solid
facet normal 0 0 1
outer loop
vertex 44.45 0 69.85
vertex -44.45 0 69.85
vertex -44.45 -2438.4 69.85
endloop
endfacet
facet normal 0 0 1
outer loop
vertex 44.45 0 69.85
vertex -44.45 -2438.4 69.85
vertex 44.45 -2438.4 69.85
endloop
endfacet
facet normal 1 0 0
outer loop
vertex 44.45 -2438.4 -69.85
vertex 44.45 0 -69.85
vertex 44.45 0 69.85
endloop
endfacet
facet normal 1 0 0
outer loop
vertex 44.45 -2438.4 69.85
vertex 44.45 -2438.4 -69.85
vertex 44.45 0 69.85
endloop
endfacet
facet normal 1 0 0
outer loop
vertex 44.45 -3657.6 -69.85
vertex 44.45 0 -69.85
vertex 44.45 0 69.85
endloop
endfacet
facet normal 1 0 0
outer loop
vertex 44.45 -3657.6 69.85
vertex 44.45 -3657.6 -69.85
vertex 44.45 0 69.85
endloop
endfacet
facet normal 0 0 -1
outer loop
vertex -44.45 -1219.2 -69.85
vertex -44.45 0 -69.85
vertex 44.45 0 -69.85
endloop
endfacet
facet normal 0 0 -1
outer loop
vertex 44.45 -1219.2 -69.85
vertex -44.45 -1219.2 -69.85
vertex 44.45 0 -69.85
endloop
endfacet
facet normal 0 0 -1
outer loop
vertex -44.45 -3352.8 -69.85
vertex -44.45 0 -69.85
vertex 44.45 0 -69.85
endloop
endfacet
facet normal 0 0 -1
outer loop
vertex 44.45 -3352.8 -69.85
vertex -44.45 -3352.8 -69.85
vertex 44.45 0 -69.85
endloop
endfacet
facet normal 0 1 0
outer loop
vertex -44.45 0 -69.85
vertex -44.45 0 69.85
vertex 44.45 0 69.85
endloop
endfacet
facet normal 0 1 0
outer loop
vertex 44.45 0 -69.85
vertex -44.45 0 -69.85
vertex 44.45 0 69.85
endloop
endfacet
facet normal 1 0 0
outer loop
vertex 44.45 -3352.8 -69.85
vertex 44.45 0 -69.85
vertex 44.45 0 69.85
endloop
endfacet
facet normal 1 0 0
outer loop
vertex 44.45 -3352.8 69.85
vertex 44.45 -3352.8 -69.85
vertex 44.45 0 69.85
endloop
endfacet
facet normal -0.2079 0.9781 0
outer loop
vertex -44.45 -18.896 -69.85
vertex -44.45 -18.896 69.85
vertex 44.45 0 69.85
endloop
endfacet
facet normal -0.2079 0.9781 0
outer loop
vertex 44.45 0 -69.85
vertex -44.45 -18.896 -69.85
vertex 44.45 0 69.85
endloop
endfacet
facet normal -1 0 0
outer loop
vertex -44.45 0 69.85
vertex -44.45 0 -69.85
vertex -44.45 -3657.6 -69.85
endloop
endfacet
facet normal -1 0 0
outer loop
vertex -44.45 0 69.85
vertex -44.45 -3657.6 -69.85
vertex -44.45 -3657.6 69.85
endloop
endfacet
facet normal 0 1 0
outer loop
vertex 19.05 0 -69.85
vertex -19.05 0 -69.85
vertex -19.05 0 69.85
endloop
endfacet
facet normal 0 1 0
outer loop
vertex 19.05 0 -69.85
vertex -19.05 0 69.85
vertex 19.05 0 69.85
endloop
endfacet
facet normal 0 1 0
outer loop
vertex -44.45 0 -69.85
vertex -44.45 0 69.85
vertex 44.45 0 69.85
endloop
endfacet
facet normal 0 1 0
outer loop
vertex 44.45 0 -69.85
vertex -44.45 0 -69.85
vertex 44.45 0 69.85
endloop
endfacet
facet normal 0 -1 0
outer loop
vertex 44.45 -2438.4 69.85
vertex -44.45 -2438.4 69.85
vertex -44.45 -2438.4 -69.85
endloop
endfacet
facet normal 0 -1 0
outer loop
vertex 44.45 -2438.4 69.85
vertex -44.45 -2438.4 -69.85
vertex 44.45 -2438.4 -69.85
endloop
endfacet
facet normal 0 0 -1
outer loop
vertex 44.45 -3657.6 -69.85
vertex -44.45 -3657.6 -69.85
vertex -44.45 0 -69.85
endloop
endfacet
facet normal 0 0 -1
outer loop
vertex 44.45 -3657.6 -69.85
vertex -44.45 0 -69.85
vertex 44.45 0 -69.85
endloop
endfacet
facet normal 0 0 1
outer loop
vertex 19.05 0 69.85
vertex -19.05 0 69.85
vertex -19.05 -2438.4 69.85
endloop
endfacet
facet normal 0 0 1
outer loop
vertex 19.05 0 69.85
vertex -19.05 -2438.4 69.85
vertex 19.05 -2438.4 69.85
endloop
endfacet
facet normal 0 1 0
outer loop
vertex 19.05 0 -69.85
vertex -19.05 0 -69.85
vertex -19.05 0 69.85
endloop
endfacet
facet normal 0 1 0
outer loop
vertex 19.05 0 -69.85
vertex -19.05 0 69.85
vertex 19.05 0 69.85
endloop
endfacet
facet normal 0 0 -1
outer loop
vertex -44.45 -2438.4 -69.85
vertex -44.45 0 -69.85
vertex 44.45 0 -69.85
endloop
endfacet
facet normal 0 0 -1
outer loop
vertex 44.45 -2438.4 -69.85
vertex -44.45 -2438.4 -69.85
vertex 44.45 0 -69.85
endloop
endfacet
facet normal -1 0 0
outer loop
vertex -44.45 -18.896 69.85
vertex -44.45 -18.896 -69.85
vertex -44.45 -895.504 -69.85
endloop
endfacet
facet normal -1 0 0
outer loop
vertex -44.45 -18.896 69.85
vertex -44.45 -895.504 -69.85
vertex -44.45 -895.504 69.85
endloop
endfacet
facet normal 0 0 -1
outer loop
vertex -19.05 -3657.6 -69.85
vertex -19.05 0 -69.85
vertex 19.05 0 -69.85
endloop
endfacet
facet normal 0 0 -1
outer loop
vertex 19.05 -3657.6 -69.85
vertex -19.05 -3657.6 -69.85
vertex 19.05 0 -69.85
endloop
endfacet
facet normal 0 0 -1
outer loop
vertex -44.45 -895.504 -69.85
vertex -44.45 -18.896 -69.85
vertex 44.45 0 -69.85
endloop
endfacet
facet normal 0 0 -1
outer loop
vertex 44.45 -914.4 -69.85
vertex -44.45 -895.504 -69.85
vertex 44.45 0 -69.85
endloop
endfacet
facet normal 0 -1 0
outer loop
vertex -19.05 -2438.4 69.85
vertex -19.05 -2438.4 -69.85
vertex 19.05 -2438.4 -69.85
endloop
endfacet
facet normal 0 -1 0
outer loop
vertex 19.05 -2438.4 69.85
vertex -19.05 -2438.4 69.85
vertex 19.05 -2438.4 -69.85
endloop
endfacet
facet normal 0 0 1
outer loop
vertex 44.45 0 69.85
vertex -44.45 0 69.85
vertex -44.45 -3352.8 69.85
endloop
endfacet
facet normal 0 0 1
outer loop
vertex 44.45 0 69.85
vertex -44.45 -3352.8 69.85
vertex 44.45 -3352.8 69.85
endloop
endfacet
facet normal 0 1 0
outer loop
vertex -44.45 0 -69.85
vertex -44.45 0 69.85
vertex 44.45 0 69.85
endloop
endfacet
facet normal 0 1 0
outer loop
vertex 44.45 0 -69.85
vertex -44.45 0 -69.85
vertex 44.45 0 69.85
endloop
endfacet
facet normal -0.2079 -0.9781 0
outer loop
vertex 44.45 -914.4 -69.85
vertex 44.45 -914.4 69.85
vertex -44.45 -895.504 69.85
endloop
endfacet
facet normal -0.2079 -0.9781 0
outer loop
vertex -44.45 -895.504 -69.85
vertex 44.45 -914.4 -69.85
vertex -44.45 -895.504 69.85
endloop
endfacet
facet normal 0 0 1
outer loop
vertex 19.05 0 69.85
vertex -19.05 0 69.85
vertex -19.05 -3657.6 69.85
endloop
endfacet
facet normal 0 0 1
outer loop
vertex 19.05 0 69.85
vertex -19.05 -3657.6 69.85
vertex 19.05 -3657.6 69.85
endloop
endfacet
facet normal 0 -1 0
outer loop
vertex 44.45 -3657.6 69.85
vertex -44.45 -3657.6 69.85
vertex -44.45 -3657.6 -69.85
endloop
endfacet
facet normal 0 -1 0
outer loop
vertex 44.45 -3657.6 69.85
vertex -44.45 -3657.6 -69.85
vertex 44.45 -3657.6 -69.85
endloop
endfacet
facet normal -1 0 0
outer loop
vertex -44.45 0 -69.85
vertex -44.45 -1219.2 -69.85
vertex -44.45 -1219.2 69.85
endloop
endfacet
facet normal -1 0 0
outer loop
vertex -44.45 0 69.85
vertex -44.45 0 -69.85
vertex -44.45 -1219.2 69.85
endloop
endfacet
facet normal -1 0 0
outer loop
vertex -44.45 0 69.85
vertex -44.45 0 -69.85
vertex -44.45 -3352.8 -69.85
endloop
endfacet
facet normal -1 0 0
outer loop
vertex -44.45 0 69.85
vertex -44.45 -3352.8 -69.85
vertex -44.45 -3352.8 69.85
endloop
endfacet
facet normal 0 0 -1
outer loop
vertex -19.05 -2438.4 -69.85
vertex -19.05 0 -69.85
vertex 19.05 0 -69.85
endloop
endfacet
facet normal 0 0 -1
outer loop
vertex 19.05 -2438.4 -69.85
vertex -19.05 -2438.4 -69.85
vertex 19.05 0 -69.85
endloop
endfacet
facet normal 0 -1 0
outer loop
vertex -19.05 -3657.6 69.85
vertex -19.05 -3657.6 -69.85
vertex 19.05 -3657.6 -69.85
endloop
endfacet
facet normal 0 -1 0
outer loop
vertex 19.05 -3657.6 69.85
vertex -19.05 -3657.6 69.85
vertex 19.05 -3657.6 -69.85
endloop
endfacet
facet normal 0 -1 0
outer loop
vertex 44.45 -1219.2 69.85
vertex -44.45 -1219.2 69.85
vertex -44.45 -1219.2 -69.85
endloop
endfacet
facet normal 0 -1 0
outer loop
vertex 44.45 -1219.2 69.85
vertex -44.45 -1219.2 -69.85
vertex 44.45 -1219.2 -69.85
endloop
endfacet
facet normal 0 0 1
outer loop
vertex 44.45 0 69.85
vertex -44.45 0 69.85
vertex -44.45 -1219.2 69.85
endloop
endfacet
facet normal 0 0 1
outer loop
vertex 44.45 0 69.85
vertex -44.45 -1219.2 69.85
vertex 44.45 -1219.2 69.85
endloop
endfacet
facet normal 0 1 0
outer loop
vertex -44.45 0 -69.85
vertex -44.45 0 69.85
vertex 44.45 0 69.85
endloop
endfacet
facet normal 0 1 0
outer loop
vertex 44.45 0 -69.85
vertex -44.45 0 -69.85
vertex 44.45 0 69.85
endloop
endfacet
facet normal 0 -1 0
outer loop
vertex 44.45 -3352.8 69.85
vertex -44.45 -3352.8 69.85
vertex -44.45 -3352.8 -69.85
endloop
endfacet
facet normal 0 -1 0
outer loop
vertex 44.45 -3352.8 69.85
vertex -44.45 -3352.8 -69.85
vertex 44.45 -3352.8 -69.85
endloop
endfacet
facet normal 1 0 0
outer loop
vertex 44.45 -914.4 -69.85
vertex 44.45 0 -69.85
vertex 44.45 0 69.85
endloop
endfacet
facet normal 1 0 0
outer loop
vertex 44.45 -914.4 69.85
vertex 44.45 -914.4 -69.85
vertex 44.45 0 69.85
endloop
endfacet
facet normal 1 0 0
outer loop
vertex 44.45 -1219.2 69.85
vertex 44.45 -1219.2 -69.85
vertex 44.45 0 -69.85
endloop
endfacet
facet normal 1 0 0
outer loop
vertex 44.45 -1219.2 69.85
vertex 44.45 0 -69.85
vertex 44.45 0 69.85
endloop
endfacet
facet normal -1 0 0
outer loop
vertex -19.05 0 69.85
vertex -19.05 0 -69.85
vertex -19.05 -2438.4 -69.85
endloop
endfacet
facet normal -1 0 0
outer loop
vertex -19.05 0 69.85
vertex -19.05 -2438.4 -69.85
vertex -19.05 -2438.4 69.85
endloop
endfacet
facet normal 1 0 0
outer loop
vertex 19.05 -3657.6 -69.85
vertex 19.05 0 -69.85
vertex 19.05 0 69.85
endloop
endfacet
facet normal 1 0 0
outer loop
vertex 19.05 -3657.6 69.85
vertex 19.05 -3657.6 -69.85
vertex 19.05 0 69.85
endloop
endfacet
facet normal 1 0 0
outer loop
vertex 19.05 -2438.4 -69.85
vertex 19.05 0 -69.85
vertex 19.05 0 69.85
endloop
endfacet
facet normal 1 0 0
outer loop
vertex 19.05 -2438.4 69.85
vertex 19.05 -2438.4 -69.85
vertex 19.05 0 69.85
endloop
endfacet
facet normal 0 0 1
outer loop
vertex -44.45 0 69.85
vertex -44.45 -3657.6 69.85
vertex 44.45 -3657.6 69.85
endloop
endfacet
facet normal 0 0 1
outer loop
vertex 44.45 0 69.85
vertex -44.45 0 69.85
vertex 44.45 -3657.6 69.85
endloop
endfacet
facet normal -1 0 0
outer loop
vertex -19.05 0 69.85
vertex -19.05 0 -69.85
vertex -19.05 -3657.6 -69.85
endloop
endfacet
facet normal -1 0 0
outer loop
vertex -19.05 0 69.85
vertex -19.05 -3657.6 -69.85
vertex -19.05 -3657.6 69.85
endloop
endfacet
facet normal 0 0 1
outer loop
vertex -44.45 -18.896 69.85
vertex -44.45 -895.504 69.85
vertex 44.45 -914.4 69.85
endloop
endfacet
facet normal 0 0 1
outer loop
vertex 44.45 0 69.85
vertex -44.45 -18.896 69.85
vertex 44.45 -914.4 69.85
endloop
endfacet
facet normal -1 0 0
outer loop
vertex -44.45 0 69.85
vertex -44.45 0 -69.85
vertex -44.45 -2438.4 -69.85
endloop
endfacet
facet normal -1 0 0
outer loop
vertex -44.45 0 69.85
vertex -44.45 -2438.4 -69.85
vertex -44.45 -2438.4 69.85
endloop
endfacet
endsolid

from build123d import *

# Parameters (mm, degrees)
F0_W      = 88.9
F0_H      = 139.7
F2_DEPTH  = 1219.2
F3_DEPTH  = 2438.4
F4_DEPTH  = 3352.8
F5_DEPTH  = 3657.6
F1_W      = 38.1
F1_H      = 139.7
F6_DEPTH  = 2438.4
F7_DEPTH  = 3657.6
F8_DEPTH  = 914.4
F10_DEPTH = 139.701


with BuildPart() as f2:
    # F0 (on Front) → F2 (new body)
    with BuildSketch(Plane.XZ):
        Rectangle(F0_W, F0_H)
    extrude(amount=F2_DEPTH)


with BuildPart() as f3:
    # F0 (on Front) → F3 (new body)
    with BuildSketch(Plane.XZ):
        Rectangle(F0_W, F0_H)
    extrude(amount=F3_DEPTH)


with BuildPart() as f4:
    # F0 (on Front) → F4 (new body)
    with BuildSketch(Plane.XZ):
        Rectangle(F0_W, F0_H)
    extrude(amount=F4_DEPTH)


with BuildPart() as f5:
    # F0 (on Front) → F5 (new body)
    with BuildSketch(Plane.XZ):
        Rectangle(F0_W, F0_H)
    extrude(amount=F5_DEPTH)


with BuildPart() as f6:
    # F1 (on Front) → F6 (new body)
    with BuildSketch(Plane.XZ):
        Rectangle(F1_W, F1_H)
    extrude(amount=F6_DEPTH)


with BuildPart() as f7:
    # F1 (on Front) → F7 (new body)
    with BuildSketch(Plane.XZ):
        Rectangle(F1_W, F1_H)
    extrude(amount=F7_DEPTH)


with BuildPart() as f8:
    # F0 (on Front) → F8 (new body)
    with BuildSketch(Plane.XZ):
        Rectangle(F0_W, F0_H)
    extrude(amount=F8_DEPTH)

    # F9 (on face) → F10 (cut, through all)
    with BuildSketch(Plane.XY.offset(69.85)):
        Polygon((-44.45, -18.8962783325), (44.45, 0), (-44.45, 0), align=None)
        Polygon((-44.45, -895.5037216675), (-44.45, -914.4), (44.45, -914.4), align=None)
    extrude(amount=-F10_DEPTH, mode=Mode.SUBTRACT)


solid = Compound([f2.part, f3.part, f4.part, f5.part, f6.part, f7.part, f8.part])
